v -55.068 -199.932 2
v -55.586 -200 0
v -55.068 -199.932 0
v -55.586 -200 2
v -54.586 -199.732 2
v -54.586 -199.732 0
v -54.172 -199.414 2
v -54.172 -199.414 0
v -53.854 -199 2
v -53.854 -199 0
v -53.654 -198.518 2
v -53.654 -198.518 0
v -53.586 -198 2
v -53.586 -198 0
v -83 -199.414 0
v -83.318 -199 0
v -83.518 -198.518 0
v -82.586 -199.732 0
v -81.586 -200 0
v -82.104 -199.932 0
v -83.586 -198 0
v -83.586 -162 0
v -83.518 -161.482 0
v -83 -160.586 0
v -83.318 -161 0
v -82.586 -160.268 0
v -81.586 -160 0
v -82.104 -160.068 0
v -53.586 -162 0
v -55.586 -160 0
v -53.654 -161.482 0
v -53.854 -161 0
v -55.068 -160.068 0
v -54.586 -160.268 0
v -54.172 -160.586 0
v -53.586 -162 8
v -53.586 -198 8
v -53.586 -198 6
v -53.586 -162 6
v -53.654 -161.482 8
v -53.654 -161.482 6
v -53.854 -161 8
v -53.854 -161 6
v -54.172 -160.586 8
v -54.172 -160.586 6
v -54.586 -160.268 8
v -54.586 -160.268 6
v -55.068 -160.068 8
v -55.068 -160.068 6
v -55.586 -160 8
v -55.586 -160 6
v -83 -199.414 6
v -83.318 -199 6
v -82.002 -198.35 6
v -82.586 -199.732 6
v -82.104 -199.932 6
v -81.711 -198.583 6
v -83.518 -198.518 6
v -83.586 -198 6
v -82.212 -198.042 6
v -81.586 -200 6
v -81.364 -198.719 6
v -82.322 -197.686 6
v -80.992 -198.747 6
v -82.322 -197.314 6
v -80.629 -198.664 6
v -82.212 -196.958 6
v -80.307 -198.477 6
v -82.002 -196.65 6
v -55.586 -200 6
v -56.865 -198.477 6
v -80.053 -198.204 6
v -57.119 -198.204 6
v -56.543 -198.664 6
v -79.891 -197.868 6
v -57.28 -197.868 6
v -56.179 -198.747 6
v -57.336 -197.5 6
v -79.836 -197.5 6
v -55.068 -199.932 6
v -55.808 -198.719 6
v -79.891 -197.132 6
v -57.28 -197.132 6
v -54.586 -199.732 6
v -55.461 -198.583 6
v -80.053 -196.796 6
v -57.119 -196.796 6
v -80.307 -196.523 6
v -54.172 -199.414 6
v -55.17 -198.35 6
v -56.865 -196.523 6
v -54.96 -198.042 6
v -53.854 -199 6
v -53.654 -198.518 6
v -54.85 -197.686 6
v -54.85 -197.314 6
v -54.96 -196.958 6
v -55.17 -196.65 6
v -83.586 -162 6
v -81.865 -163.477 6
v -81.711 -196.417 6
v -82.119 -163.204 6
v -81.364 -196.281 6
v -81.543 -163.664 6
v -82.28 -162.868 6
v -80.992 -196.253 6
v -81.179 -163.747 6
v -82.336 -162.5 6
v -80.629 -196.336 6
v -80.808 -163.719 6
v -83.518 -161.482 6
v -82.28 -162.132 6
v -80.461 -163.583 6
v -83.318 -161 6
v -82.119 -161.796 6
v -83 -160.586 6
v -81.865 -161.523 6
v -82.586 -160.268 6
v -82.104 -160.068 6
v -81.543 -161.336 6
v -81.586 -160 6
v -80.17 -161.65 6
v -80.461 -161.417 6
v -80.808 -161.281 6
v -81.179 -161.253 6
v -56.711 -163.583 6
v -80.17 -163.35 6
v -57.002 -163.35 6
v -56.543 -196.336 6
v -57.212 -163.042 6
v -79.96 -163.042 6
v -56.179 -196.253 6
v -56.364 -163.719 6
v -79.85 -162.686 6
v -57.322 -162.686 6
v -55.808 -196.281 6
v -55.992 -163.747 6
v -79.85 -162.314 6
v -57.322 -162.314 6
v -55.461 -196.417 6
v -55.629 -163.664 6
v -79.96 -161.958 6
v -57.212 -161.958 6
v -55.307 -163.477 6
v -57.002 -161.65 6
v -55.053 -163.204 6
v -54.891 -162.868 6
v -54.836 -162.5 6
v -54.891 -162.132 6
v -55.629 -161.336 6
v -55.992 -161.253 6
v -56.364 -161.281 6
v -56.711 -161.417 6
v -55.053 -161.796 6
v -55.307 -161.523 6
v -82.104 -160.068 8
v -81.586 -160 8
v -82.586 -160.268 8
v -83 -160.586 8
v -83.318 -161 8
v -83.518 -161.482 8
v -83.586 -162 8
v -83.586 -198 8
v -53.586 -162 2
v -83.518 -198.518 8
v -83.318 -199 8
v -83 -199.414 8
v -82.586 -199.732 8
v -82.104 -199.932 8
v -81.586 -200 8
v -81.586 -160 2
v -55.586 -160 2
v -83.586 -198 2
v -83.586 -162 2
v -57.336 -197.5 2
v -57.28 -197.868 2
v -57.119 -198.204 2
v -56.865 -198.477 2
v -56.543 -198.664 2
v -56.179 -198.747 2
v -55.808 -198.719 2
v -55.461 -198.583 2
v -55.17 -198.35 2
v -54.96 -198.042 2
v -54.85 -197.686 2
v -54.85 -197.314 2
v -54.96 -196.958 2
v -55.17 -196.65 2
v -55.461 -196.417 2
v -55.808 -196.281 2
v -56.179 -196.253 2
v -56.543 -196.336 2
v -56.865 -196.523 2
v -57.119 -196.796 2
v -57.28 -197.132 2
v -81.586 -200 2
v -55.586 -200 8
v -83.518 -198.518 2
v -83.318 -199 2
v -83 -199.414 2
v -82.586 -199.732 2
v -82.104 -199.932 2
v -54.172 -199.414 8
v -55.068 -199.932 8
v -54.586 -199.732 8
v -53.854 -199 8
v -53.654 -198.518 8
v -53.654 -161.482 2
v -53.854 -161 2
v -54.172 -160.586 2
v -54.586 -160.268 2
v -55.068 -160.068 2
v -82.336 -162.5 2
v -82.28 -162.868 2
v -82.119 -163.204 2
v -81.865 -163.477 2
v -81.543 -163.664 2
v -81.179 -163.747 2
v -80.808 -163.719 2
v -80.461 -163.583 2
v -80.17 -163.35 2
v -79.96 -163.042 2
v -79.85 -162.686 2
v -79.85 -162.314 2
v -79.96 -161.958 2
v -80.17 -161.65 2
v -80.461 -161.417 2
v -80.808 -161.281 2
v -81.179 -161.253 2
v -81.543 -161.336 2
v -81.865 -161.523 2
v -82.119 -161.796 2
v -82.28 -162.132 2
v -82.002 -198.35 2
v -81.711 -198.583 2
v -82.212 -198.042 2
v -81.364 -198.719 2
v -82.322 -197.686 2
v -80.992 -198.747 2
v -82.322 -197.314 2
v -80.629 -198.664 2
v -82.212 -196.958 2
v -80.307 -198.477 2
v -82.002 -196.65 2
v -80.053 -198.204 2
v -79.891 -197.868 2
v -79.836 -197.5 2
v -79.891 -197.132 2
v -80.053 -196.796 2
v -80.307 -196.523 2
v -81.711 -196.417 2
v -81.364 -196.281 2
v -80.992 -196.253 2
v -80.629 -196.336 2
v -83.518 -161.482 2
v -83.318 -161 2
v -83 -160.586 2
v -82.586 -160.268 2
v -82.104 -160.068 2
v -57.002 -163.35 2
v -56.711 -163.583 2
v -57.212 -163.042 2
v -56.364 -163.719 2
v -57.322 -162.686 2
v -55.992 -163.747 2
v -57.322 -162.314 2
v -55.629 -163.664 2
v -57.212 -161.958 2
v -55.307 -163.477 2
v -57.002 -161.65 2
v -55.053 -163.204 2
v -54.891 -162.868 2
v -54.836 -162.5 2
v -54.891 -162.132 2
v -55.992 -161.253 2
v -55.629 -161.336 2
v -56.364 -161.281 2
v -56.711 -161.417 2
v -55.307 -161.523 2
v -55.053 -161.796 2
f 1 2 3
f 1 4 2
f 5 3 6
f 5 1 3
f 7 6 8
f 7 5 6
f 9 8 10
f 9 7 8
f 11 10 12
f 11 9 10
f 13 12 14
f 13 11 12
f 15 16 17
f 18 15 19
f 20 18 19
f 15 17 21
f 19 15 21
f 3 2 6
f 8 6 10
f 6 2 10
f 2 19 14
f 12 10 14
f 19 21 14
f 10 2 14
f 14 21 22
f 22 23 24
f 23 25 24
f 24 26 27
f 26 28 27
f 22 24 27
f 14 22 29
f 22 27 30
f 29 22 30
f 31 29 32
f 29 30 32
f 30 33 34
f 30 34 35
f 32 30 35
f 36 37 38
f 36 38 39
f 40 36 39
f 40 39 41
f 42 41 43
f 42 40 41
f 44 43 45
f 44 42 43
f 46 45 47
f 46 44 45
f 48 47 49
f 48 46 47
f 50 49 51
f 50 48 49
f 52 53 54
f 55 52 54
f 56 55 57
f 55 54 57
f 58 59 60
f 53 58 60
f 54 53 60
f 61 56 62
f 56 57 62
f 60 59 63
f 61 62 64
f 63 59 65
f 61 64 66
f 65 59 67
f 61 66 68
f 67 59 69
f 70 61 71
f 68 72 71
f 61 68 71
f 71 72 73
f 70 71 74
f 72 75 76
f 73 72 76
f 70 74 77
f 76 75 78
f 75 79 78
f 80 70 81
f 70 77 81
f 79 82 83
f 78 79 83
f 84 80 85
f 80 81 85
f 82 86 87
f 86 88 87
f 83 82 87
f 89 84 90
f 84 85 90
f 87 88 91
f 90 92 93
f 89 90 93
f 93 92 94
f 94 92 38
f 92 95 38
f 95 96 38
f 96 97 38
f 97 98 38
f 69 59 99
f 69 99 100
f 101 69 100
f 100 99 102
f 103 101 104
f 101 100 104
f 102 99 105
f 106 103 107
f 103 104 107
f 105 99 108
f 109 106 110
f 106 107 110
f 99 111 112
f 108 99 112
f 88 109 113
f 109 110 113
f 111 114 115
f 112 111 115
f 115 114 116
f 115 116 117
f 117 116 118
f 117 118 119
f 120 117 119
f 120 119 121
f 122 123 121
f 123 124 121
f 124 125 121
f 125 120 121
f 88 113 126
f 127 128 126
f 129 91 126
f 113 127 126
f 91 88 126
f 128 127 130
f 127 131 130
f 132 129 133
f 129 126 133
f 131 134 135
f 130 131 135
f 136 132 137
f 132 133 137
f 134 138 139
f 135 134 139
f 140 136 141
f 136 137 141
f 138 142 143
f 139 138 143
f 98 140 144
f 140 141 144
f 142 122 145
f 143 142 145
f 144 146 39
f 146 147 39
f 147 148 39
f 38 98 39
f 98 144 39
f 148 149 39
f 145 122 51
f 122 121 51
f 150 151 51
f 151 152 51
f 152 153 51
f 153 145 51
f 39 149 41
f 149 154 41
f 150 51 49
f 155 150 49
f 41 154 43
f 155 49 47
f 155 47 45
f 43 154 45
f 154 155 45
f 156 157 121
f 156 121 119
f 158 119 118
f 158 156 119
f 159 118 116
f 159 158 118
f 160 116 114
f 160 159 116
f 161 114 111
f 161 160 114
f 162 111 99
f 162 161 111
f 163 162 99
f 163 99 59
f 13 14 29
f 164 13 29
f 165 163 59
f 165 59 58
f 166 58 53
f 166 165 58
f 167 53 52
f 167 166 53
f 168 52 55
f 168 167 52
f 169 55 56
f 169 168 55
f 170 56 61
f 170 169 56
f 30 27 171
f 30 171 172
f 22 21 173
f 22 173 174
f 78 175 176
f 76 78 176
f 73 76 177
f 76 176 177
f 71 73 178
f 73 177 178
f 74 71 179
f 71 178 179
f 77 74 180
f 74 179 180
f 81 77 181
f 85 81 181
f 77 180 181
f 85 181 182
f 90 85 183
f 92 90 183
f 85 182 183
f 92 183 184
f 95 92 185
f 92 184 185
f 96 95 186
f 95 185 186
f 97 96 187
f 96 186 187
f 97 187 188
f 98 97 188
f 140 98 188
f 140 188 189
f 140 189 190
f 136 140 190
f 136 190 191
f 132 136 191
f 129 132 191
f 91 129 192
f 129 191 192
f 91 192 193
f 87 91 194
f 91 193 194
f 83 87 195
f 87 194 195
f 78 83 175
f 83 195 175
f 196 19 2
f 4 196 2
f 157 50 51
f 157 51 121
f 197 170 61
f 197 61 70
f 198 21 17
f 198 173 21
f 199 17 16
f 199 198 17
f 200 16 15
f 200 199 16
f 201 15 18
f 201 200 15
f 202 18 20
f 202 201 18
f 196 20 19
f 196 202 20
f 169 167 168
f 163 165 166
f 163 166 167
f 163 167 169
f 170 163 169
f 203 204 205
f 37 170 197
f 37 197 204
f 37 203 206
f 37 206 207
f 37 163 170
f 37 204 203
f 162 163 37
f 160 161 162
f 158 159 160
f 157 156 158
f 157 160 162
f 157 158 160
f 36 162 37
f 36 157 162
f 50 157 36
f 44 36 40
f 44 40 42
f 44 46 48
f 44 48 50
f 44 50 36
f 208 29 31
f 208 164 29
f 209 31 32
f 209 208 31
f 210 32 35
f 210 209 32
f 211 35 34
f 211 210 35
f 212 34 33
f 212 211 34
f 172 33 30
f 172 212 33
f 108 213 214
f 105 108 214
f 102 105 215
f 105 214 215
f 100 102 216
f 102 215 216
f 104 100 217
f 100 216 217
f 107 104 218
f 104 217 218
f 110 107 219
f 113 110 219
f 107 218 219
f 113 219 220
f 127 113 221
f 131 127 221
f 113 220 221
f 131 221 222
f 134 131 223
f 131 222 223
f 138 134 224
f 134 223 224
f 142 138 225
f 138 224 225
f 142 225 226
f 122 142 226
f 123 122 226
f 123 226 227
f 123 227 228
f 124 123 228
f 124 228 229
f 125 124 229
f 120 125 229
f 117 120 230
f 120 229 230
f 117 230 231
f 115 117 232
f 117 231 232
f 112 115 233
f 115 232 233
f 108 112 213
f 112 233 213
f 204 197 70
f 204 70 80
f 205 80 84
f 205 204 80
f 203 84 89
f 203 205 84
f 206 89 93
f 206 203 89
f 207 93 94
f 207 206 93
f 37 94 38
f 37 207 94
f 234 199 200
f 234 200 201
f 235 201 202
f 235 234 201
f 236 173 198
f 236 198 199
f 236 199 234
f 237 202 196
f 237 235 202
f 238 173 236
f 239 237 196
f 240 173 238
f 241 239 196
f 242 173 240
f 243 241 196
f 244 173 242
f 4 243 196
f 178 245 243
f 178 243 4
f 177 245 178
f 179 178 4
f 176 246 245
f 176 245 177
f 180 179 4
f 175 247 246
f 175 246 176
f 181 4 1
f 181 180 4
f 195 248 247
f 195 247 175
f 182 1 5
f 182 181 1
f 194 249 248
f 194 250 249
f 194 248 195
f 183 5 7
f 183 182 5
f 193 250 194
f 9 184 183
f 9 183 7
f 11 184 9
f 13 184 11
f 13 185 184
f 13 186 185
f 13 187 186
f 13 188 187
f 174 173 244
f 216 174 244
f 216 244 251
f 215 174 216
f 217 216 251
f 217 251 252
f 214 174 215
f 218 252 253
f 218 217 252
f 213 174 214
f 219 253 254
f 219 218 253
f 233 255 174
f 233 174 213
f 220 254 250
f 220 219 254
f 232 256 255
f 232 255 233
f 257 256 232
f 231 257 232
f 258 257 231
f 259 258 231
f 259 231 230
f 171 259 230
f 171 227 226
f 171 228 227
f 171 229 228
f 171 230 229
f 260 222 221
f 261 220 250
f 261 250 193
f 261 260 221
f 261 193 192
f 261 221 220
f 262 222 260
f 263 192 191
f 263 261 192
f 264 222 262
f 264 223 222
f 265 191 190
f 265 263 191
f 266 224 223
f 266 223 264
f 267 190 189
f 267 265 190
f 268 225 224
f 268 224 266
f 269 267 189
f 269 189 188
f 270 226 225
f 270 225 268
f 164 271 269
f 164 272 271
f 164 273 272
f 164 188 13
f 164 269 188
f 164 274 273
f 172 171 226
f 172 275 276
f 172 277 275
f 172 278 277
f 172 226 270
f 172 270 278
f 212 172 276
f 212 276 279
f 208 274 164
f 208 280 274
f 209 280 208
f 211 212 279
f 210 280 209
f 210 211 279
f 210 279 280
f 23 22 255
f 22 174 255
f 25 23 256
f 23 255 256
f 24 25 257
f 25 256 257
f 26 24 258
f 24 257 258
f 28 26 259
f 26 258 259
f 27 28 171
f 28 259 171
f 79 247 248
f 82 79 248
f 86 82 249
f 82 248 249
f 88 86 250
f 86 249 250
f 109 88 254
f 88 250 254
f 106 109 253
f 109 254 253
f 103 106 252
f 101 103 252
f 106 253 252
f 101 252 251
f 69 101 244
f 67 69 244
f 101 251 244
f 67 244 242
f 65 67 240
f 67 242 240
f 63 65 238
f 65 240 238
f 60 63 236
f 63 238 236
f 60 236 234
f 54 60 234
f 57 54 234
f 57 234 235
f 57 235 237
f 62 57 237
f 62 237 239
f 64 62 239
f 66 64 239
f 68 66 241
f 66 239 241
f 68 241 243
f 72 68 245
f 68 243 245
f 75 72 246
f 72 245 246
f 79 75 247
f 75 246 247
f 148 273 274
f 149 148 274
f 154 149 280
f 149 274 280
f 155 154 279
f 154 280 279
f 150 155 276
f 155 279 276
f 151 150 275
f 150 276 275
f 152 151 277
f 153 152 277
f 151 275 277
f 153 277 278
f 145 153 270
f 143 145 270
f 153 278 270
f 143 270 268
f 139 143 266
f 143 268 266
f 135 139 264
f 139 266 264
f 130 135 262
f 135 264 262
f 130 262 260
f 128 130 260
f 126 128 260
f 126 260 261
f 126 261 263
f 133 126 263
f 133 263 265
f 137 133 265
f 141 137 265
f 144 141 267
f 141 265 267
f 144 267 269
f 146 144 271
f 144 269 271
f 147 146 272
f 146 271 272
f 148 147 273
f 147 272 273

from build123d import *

# Parameters (mm, degrees)
SKETCH1_W           = 30
SKETCH1_H           = 40
BOSS_EXTRUDE1_DEPTH = 2
FILLET1_R           = 2
SKETCH2_R           = 1.25
BOSS_EXTRUDE2_DEPTH = 4
BOSS_EXTRUDE3_START = 2
BOSS_EXTRUDE3_DEPTH = 2


with BuildPart() as part:
    # Sketch1 → Boss-Extrude1 (new body)
    with BuildSketch(Plane.XY):
        with Locations((-68.585871194, -180)):
            Rectangle(SKETCH1_W, SKETCH1_H)
    extrude(amount=BOSS_EXTRUDE1_DEPTH)

    # Fillet1
    fillet1_edges = [part.edges().sort_by_distance(p)[0] for p in [
        (-83.585871194, -160, 1),
        (-53.585871194, -160, 1),
        (-53.585871194, -200, 1),
        (-83.585871194, -200, 1),
    ]]
    fillet(fillet1_edges, radius=FILLET1_R)

    # Sketch2 → Boss-Extrude2 (add)
    with BuildSketch(Plane.XY.offset(2)):
        with Locations((-81.085871194, -197.5)):
            Circle(SKETCH2_R)
        with Locations(Location((-56.085871194, -197.5, 0), (0, 0, 180))):
            Circle(SKETCH2_R)
        with Locations((-56.085871194, -162.5)):
            Circle(SKETCH2_R)
        with Locations(Location((-81.085871194, -162.5, 0), (0, 0, 180))):
            Circle(SKETCH2_R)
    extrude(amount=BOSS_EXTRUDE2_DEPTH)

    # Sketch3 → Boss-Extrude3 (add)
    with BuildSketch(Plane.XY.offset(6).offset(BOSS_EXTRUDE3_START)):
        with BuildLine():
            Line((-53.585871194, -198), (-53.585871194, -162))
            ThreePointArc((-53.585871194, -162), (-54.171657631, -160.585786438), (-55.585871194, -160))
            Line((-55.585871194, -160), (-81.585871194, -160))
            ThreePointArc((-81.585871194, -160), (-83.000084756, -160.585786438), (-83.585871194, -162))
            Line((-83.585871194, -162), (-83.585871194, -198))
            ThreePointArc((-83.585871194, -198), (-83.000084756, -199.414213562), (-81.585871194, -200))
            Line((-81.585871194, -200), (-55.585871194, -200))
            ThreePointArc((-55.585871194, -200), (-54.171657631, -199.414213562), (-53.585871194, -198))
        make_face()
    extrude(amount=-BOSS_EXTRUDE3_DEPTH)


solid = part.part
